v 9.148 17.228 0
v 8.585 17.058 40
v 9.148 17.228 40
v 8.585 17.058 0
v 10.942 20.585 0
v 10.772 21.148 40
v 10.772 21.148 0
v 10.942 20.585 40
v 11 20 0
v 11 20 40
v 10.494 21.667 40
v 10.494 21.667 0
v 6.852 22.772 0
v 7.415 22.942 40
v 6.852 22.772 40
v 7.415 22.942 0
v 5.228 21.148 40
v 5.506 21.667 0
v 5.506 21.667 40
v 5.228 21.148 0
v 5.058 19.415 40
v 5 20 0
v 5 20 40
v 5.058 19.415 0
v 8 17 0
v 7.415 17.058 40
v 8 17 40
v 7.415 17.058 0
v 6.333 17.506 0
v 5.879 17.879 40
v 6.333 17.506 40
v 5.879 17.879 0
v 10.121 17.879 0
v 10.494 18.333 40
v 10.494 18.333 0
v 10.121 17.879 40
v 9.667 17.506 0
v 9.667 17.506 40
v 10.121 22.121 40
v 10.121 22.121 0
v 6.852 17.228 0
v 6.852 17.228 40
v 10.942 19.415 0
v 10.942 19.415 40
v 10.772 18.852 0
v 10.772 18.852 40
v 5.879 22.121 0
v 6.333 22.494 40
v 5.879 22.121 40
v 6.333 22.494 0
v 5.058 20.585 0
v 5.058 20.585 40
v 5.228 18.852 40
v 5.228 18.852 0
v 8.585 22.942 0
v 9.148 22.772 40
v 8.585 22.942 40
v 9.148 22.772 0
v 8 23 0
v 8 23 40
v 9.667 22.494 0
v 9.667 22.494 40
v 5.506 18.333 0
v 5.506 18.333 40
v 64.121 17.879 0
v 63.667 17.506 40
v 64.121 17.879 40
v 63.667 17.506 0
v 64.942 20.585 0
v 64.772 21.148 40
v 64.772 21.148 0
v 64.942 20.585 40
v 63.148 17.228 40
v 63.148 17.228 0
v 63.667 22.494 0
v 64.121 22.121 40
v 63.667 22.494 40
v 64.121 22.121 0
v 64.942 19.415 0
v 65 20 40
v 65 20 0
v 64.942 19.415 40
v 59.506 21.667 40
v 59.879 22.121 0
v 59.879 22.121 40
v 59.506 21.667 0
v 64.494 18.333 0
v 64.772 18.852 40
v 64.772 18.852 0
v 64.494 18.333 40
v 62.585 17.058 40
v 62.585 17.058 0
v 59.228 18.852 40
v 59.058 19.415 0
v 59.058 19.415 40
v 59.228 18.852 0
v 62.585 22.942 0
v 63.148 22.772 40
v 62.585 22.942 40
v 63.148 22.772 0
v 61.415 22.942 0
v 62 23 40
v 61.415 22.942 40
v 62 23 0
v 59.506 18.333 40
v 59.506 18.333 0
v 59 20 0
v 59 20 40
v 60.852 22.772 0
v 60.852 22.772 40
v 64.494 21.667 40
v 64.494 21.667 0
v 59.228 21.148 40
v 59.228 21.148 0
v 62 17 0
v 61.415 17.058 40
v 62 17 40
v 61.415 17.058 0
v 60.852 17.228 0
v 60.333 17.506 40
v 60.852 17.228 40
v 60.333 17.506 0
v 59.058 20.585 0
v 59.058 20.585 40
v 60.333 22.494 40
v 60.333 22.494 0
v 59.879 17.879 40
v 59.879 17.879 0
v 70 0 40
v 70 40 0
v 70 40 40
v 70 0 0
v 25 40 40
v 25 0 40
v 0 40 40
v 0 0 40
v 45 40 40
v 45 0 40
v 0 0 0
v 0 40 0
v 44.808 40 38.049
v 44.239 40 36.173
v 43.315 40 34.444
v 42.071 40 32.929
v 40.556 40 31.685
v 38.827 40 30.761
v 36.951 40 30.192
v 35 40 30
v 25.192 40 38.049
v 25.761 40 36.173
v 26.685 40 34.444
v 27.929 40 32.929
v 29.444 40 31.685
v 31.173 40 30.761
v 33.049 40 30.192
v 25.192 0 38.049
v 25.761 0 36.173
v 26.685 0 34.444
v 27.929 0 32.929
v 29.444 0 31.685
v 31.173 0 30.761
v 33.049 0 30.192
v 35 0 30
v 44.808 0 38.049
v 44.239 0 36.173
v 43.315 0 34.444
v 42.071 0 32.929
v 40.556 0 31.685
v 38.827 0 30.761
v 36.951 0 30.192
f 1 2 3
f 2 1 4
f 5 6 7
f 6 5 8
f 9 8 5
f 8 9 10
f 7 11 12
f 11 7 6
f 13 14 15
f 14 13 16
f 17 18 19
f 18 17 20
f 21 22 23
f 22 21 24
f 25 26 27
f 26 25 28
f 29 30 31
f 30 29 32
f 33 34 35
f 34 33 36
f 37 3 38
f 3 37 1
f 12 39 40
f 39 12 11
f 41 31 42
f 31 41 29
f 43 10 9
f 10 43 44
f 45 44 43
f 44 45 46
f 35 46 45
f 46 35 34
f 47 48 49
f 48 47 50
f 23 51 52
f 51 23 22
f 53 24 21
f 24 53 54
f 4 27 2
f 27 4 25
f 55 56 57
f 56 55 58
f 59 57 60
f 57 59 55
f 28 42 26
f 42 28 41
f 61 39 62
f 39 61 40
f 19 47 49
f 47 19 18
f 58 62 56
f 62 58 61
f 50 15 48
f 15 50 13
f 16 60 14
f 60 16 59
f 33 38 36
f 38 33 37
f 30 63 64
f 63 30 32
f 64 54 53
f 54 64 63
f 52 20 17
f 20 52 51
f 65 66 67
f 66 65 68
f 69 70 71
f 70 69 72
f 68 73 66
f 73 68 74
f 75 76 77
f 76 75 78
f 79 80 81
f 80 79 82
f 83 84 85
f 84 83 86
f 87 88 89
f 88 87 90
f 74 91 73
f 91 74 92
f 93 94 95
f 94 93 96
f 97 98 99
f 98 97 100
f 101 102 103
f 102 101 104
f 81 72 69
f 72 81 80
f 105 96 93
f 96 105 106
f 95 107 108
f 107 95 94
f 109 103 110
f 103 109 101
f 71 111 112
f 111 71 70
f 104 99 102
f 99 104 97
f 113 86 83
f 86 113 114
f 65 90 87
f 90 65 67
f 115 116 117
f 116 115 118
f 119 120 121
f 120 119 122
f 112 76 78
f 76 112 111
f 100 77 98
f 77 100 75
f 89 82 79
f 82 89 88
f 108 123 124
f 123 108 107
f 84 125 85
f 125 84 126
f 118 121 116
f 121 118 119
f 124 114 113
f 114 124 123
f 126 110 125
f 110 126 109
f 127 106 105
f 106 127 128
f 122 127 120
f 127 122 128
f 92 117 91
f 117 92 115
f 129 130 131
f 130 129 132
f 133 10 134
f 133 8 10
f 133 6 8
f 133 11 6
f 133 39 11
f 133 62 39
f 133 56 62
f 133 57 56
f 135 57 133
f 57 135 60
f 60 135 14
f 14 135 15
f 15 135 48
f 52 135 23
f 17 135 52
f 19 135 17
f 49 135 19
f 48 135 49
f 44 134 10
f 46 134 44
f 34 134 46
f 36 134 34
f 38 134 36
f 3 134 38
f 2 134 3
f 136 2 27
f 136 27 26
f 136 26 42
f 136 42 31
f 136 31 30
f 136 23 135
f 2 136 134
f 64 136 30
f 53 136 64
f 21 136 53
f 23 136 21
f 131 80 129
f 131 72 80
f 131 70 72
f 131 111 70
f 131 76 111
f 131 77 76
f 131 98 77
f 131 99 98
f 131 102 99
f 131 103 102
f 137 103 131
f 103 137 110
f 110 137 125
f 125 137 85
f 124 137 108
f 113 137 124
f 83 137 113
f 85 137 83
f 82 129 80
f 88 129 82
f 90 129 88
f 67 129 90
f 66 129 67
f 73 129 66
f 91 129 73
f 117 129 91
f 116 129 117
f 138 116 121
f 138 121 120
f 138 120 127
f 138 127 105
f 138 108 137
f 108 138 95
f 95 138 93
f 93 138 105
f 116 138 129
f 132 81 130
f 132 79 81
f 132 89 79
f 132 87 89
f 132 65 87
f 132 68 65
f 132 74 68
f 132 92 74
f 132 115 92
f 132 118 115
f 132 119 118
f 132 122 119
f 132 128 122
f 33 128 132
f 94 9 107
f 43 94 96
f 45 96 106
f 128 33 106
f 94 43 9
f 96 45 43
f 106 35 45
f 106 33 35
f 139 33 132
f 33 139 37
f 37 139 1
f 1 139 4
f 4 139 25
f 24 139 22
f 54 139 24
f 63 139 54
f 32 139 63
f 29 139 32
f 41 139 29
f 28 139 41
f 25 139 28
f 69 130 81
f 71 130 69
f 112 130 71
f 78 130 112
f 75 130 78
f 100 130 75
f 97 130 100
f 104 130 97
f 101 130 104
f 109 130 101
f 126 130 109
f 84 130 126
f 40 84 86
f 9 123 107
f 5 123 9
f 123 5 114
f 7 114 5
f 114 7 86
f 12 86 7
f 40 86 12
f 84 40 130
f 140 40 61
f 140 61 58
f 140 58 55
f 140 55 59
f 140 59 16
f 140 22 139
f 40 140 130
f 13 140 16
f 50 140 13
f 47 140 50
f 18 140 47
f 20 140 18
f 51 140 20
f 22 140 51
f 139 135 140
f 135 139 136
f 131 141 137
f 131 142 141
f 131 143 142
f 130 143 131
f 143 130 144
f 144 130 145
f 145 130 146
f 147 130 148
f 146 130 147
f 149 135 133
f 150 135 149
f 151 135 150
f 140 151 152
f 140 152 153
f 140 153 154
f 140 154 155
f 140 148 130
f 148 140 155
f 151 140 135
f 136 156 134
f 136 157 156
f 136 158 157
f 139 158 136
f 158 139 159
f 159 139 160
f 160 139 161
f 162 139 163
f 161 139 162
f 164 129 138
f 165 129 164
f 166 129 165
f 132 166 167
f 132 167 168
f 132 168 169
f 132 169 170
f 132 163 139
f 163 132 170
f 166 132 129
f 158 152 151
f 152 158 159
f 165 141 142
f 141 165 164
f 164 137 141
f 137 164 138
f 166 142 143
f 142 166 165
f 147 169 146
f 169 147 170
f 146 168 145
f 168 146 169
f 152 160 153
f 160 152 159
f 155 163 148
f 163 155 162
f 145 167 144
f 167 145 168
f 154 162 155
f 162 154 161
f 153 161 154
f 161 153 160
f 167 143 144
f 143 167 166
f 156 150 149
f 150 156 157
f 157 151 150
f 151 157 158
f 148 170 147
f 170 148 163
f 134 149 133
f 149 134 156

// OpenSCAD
$fn = 32;

// ----------------------------------------------------------------------
// Saddle clamp: plain shaft clamp
// ----------------------------------------------------------------------

// --- parameters (mm) ---
blk_l = 70;               // block length, X
blk_w = 40;               // block width, Y
blk_h = 40;               // block height
clamp_r = 10;             // shaft groove radius
hole_r = 3;               // bolt hole radius
hole_m = 8;               // bolt hole margin from the ends

saw_depth = clamp_r + 3;  // saw kerf depth

difference() {
  cube([blk_l, blk_w, blk_h]);
  translate([blk_l / 2, -1, blk_h])
    rotate([-90, 0, 0])
      cylinder(h = blk_w + 2, r = clamp_r);
  for (sx = [0, 1])
    translate([sx ? blk_l - hole_m : hole_m, blk_w / 2, -1])
      cylinder(r = hole_r, h = blk_h + 2);
}
